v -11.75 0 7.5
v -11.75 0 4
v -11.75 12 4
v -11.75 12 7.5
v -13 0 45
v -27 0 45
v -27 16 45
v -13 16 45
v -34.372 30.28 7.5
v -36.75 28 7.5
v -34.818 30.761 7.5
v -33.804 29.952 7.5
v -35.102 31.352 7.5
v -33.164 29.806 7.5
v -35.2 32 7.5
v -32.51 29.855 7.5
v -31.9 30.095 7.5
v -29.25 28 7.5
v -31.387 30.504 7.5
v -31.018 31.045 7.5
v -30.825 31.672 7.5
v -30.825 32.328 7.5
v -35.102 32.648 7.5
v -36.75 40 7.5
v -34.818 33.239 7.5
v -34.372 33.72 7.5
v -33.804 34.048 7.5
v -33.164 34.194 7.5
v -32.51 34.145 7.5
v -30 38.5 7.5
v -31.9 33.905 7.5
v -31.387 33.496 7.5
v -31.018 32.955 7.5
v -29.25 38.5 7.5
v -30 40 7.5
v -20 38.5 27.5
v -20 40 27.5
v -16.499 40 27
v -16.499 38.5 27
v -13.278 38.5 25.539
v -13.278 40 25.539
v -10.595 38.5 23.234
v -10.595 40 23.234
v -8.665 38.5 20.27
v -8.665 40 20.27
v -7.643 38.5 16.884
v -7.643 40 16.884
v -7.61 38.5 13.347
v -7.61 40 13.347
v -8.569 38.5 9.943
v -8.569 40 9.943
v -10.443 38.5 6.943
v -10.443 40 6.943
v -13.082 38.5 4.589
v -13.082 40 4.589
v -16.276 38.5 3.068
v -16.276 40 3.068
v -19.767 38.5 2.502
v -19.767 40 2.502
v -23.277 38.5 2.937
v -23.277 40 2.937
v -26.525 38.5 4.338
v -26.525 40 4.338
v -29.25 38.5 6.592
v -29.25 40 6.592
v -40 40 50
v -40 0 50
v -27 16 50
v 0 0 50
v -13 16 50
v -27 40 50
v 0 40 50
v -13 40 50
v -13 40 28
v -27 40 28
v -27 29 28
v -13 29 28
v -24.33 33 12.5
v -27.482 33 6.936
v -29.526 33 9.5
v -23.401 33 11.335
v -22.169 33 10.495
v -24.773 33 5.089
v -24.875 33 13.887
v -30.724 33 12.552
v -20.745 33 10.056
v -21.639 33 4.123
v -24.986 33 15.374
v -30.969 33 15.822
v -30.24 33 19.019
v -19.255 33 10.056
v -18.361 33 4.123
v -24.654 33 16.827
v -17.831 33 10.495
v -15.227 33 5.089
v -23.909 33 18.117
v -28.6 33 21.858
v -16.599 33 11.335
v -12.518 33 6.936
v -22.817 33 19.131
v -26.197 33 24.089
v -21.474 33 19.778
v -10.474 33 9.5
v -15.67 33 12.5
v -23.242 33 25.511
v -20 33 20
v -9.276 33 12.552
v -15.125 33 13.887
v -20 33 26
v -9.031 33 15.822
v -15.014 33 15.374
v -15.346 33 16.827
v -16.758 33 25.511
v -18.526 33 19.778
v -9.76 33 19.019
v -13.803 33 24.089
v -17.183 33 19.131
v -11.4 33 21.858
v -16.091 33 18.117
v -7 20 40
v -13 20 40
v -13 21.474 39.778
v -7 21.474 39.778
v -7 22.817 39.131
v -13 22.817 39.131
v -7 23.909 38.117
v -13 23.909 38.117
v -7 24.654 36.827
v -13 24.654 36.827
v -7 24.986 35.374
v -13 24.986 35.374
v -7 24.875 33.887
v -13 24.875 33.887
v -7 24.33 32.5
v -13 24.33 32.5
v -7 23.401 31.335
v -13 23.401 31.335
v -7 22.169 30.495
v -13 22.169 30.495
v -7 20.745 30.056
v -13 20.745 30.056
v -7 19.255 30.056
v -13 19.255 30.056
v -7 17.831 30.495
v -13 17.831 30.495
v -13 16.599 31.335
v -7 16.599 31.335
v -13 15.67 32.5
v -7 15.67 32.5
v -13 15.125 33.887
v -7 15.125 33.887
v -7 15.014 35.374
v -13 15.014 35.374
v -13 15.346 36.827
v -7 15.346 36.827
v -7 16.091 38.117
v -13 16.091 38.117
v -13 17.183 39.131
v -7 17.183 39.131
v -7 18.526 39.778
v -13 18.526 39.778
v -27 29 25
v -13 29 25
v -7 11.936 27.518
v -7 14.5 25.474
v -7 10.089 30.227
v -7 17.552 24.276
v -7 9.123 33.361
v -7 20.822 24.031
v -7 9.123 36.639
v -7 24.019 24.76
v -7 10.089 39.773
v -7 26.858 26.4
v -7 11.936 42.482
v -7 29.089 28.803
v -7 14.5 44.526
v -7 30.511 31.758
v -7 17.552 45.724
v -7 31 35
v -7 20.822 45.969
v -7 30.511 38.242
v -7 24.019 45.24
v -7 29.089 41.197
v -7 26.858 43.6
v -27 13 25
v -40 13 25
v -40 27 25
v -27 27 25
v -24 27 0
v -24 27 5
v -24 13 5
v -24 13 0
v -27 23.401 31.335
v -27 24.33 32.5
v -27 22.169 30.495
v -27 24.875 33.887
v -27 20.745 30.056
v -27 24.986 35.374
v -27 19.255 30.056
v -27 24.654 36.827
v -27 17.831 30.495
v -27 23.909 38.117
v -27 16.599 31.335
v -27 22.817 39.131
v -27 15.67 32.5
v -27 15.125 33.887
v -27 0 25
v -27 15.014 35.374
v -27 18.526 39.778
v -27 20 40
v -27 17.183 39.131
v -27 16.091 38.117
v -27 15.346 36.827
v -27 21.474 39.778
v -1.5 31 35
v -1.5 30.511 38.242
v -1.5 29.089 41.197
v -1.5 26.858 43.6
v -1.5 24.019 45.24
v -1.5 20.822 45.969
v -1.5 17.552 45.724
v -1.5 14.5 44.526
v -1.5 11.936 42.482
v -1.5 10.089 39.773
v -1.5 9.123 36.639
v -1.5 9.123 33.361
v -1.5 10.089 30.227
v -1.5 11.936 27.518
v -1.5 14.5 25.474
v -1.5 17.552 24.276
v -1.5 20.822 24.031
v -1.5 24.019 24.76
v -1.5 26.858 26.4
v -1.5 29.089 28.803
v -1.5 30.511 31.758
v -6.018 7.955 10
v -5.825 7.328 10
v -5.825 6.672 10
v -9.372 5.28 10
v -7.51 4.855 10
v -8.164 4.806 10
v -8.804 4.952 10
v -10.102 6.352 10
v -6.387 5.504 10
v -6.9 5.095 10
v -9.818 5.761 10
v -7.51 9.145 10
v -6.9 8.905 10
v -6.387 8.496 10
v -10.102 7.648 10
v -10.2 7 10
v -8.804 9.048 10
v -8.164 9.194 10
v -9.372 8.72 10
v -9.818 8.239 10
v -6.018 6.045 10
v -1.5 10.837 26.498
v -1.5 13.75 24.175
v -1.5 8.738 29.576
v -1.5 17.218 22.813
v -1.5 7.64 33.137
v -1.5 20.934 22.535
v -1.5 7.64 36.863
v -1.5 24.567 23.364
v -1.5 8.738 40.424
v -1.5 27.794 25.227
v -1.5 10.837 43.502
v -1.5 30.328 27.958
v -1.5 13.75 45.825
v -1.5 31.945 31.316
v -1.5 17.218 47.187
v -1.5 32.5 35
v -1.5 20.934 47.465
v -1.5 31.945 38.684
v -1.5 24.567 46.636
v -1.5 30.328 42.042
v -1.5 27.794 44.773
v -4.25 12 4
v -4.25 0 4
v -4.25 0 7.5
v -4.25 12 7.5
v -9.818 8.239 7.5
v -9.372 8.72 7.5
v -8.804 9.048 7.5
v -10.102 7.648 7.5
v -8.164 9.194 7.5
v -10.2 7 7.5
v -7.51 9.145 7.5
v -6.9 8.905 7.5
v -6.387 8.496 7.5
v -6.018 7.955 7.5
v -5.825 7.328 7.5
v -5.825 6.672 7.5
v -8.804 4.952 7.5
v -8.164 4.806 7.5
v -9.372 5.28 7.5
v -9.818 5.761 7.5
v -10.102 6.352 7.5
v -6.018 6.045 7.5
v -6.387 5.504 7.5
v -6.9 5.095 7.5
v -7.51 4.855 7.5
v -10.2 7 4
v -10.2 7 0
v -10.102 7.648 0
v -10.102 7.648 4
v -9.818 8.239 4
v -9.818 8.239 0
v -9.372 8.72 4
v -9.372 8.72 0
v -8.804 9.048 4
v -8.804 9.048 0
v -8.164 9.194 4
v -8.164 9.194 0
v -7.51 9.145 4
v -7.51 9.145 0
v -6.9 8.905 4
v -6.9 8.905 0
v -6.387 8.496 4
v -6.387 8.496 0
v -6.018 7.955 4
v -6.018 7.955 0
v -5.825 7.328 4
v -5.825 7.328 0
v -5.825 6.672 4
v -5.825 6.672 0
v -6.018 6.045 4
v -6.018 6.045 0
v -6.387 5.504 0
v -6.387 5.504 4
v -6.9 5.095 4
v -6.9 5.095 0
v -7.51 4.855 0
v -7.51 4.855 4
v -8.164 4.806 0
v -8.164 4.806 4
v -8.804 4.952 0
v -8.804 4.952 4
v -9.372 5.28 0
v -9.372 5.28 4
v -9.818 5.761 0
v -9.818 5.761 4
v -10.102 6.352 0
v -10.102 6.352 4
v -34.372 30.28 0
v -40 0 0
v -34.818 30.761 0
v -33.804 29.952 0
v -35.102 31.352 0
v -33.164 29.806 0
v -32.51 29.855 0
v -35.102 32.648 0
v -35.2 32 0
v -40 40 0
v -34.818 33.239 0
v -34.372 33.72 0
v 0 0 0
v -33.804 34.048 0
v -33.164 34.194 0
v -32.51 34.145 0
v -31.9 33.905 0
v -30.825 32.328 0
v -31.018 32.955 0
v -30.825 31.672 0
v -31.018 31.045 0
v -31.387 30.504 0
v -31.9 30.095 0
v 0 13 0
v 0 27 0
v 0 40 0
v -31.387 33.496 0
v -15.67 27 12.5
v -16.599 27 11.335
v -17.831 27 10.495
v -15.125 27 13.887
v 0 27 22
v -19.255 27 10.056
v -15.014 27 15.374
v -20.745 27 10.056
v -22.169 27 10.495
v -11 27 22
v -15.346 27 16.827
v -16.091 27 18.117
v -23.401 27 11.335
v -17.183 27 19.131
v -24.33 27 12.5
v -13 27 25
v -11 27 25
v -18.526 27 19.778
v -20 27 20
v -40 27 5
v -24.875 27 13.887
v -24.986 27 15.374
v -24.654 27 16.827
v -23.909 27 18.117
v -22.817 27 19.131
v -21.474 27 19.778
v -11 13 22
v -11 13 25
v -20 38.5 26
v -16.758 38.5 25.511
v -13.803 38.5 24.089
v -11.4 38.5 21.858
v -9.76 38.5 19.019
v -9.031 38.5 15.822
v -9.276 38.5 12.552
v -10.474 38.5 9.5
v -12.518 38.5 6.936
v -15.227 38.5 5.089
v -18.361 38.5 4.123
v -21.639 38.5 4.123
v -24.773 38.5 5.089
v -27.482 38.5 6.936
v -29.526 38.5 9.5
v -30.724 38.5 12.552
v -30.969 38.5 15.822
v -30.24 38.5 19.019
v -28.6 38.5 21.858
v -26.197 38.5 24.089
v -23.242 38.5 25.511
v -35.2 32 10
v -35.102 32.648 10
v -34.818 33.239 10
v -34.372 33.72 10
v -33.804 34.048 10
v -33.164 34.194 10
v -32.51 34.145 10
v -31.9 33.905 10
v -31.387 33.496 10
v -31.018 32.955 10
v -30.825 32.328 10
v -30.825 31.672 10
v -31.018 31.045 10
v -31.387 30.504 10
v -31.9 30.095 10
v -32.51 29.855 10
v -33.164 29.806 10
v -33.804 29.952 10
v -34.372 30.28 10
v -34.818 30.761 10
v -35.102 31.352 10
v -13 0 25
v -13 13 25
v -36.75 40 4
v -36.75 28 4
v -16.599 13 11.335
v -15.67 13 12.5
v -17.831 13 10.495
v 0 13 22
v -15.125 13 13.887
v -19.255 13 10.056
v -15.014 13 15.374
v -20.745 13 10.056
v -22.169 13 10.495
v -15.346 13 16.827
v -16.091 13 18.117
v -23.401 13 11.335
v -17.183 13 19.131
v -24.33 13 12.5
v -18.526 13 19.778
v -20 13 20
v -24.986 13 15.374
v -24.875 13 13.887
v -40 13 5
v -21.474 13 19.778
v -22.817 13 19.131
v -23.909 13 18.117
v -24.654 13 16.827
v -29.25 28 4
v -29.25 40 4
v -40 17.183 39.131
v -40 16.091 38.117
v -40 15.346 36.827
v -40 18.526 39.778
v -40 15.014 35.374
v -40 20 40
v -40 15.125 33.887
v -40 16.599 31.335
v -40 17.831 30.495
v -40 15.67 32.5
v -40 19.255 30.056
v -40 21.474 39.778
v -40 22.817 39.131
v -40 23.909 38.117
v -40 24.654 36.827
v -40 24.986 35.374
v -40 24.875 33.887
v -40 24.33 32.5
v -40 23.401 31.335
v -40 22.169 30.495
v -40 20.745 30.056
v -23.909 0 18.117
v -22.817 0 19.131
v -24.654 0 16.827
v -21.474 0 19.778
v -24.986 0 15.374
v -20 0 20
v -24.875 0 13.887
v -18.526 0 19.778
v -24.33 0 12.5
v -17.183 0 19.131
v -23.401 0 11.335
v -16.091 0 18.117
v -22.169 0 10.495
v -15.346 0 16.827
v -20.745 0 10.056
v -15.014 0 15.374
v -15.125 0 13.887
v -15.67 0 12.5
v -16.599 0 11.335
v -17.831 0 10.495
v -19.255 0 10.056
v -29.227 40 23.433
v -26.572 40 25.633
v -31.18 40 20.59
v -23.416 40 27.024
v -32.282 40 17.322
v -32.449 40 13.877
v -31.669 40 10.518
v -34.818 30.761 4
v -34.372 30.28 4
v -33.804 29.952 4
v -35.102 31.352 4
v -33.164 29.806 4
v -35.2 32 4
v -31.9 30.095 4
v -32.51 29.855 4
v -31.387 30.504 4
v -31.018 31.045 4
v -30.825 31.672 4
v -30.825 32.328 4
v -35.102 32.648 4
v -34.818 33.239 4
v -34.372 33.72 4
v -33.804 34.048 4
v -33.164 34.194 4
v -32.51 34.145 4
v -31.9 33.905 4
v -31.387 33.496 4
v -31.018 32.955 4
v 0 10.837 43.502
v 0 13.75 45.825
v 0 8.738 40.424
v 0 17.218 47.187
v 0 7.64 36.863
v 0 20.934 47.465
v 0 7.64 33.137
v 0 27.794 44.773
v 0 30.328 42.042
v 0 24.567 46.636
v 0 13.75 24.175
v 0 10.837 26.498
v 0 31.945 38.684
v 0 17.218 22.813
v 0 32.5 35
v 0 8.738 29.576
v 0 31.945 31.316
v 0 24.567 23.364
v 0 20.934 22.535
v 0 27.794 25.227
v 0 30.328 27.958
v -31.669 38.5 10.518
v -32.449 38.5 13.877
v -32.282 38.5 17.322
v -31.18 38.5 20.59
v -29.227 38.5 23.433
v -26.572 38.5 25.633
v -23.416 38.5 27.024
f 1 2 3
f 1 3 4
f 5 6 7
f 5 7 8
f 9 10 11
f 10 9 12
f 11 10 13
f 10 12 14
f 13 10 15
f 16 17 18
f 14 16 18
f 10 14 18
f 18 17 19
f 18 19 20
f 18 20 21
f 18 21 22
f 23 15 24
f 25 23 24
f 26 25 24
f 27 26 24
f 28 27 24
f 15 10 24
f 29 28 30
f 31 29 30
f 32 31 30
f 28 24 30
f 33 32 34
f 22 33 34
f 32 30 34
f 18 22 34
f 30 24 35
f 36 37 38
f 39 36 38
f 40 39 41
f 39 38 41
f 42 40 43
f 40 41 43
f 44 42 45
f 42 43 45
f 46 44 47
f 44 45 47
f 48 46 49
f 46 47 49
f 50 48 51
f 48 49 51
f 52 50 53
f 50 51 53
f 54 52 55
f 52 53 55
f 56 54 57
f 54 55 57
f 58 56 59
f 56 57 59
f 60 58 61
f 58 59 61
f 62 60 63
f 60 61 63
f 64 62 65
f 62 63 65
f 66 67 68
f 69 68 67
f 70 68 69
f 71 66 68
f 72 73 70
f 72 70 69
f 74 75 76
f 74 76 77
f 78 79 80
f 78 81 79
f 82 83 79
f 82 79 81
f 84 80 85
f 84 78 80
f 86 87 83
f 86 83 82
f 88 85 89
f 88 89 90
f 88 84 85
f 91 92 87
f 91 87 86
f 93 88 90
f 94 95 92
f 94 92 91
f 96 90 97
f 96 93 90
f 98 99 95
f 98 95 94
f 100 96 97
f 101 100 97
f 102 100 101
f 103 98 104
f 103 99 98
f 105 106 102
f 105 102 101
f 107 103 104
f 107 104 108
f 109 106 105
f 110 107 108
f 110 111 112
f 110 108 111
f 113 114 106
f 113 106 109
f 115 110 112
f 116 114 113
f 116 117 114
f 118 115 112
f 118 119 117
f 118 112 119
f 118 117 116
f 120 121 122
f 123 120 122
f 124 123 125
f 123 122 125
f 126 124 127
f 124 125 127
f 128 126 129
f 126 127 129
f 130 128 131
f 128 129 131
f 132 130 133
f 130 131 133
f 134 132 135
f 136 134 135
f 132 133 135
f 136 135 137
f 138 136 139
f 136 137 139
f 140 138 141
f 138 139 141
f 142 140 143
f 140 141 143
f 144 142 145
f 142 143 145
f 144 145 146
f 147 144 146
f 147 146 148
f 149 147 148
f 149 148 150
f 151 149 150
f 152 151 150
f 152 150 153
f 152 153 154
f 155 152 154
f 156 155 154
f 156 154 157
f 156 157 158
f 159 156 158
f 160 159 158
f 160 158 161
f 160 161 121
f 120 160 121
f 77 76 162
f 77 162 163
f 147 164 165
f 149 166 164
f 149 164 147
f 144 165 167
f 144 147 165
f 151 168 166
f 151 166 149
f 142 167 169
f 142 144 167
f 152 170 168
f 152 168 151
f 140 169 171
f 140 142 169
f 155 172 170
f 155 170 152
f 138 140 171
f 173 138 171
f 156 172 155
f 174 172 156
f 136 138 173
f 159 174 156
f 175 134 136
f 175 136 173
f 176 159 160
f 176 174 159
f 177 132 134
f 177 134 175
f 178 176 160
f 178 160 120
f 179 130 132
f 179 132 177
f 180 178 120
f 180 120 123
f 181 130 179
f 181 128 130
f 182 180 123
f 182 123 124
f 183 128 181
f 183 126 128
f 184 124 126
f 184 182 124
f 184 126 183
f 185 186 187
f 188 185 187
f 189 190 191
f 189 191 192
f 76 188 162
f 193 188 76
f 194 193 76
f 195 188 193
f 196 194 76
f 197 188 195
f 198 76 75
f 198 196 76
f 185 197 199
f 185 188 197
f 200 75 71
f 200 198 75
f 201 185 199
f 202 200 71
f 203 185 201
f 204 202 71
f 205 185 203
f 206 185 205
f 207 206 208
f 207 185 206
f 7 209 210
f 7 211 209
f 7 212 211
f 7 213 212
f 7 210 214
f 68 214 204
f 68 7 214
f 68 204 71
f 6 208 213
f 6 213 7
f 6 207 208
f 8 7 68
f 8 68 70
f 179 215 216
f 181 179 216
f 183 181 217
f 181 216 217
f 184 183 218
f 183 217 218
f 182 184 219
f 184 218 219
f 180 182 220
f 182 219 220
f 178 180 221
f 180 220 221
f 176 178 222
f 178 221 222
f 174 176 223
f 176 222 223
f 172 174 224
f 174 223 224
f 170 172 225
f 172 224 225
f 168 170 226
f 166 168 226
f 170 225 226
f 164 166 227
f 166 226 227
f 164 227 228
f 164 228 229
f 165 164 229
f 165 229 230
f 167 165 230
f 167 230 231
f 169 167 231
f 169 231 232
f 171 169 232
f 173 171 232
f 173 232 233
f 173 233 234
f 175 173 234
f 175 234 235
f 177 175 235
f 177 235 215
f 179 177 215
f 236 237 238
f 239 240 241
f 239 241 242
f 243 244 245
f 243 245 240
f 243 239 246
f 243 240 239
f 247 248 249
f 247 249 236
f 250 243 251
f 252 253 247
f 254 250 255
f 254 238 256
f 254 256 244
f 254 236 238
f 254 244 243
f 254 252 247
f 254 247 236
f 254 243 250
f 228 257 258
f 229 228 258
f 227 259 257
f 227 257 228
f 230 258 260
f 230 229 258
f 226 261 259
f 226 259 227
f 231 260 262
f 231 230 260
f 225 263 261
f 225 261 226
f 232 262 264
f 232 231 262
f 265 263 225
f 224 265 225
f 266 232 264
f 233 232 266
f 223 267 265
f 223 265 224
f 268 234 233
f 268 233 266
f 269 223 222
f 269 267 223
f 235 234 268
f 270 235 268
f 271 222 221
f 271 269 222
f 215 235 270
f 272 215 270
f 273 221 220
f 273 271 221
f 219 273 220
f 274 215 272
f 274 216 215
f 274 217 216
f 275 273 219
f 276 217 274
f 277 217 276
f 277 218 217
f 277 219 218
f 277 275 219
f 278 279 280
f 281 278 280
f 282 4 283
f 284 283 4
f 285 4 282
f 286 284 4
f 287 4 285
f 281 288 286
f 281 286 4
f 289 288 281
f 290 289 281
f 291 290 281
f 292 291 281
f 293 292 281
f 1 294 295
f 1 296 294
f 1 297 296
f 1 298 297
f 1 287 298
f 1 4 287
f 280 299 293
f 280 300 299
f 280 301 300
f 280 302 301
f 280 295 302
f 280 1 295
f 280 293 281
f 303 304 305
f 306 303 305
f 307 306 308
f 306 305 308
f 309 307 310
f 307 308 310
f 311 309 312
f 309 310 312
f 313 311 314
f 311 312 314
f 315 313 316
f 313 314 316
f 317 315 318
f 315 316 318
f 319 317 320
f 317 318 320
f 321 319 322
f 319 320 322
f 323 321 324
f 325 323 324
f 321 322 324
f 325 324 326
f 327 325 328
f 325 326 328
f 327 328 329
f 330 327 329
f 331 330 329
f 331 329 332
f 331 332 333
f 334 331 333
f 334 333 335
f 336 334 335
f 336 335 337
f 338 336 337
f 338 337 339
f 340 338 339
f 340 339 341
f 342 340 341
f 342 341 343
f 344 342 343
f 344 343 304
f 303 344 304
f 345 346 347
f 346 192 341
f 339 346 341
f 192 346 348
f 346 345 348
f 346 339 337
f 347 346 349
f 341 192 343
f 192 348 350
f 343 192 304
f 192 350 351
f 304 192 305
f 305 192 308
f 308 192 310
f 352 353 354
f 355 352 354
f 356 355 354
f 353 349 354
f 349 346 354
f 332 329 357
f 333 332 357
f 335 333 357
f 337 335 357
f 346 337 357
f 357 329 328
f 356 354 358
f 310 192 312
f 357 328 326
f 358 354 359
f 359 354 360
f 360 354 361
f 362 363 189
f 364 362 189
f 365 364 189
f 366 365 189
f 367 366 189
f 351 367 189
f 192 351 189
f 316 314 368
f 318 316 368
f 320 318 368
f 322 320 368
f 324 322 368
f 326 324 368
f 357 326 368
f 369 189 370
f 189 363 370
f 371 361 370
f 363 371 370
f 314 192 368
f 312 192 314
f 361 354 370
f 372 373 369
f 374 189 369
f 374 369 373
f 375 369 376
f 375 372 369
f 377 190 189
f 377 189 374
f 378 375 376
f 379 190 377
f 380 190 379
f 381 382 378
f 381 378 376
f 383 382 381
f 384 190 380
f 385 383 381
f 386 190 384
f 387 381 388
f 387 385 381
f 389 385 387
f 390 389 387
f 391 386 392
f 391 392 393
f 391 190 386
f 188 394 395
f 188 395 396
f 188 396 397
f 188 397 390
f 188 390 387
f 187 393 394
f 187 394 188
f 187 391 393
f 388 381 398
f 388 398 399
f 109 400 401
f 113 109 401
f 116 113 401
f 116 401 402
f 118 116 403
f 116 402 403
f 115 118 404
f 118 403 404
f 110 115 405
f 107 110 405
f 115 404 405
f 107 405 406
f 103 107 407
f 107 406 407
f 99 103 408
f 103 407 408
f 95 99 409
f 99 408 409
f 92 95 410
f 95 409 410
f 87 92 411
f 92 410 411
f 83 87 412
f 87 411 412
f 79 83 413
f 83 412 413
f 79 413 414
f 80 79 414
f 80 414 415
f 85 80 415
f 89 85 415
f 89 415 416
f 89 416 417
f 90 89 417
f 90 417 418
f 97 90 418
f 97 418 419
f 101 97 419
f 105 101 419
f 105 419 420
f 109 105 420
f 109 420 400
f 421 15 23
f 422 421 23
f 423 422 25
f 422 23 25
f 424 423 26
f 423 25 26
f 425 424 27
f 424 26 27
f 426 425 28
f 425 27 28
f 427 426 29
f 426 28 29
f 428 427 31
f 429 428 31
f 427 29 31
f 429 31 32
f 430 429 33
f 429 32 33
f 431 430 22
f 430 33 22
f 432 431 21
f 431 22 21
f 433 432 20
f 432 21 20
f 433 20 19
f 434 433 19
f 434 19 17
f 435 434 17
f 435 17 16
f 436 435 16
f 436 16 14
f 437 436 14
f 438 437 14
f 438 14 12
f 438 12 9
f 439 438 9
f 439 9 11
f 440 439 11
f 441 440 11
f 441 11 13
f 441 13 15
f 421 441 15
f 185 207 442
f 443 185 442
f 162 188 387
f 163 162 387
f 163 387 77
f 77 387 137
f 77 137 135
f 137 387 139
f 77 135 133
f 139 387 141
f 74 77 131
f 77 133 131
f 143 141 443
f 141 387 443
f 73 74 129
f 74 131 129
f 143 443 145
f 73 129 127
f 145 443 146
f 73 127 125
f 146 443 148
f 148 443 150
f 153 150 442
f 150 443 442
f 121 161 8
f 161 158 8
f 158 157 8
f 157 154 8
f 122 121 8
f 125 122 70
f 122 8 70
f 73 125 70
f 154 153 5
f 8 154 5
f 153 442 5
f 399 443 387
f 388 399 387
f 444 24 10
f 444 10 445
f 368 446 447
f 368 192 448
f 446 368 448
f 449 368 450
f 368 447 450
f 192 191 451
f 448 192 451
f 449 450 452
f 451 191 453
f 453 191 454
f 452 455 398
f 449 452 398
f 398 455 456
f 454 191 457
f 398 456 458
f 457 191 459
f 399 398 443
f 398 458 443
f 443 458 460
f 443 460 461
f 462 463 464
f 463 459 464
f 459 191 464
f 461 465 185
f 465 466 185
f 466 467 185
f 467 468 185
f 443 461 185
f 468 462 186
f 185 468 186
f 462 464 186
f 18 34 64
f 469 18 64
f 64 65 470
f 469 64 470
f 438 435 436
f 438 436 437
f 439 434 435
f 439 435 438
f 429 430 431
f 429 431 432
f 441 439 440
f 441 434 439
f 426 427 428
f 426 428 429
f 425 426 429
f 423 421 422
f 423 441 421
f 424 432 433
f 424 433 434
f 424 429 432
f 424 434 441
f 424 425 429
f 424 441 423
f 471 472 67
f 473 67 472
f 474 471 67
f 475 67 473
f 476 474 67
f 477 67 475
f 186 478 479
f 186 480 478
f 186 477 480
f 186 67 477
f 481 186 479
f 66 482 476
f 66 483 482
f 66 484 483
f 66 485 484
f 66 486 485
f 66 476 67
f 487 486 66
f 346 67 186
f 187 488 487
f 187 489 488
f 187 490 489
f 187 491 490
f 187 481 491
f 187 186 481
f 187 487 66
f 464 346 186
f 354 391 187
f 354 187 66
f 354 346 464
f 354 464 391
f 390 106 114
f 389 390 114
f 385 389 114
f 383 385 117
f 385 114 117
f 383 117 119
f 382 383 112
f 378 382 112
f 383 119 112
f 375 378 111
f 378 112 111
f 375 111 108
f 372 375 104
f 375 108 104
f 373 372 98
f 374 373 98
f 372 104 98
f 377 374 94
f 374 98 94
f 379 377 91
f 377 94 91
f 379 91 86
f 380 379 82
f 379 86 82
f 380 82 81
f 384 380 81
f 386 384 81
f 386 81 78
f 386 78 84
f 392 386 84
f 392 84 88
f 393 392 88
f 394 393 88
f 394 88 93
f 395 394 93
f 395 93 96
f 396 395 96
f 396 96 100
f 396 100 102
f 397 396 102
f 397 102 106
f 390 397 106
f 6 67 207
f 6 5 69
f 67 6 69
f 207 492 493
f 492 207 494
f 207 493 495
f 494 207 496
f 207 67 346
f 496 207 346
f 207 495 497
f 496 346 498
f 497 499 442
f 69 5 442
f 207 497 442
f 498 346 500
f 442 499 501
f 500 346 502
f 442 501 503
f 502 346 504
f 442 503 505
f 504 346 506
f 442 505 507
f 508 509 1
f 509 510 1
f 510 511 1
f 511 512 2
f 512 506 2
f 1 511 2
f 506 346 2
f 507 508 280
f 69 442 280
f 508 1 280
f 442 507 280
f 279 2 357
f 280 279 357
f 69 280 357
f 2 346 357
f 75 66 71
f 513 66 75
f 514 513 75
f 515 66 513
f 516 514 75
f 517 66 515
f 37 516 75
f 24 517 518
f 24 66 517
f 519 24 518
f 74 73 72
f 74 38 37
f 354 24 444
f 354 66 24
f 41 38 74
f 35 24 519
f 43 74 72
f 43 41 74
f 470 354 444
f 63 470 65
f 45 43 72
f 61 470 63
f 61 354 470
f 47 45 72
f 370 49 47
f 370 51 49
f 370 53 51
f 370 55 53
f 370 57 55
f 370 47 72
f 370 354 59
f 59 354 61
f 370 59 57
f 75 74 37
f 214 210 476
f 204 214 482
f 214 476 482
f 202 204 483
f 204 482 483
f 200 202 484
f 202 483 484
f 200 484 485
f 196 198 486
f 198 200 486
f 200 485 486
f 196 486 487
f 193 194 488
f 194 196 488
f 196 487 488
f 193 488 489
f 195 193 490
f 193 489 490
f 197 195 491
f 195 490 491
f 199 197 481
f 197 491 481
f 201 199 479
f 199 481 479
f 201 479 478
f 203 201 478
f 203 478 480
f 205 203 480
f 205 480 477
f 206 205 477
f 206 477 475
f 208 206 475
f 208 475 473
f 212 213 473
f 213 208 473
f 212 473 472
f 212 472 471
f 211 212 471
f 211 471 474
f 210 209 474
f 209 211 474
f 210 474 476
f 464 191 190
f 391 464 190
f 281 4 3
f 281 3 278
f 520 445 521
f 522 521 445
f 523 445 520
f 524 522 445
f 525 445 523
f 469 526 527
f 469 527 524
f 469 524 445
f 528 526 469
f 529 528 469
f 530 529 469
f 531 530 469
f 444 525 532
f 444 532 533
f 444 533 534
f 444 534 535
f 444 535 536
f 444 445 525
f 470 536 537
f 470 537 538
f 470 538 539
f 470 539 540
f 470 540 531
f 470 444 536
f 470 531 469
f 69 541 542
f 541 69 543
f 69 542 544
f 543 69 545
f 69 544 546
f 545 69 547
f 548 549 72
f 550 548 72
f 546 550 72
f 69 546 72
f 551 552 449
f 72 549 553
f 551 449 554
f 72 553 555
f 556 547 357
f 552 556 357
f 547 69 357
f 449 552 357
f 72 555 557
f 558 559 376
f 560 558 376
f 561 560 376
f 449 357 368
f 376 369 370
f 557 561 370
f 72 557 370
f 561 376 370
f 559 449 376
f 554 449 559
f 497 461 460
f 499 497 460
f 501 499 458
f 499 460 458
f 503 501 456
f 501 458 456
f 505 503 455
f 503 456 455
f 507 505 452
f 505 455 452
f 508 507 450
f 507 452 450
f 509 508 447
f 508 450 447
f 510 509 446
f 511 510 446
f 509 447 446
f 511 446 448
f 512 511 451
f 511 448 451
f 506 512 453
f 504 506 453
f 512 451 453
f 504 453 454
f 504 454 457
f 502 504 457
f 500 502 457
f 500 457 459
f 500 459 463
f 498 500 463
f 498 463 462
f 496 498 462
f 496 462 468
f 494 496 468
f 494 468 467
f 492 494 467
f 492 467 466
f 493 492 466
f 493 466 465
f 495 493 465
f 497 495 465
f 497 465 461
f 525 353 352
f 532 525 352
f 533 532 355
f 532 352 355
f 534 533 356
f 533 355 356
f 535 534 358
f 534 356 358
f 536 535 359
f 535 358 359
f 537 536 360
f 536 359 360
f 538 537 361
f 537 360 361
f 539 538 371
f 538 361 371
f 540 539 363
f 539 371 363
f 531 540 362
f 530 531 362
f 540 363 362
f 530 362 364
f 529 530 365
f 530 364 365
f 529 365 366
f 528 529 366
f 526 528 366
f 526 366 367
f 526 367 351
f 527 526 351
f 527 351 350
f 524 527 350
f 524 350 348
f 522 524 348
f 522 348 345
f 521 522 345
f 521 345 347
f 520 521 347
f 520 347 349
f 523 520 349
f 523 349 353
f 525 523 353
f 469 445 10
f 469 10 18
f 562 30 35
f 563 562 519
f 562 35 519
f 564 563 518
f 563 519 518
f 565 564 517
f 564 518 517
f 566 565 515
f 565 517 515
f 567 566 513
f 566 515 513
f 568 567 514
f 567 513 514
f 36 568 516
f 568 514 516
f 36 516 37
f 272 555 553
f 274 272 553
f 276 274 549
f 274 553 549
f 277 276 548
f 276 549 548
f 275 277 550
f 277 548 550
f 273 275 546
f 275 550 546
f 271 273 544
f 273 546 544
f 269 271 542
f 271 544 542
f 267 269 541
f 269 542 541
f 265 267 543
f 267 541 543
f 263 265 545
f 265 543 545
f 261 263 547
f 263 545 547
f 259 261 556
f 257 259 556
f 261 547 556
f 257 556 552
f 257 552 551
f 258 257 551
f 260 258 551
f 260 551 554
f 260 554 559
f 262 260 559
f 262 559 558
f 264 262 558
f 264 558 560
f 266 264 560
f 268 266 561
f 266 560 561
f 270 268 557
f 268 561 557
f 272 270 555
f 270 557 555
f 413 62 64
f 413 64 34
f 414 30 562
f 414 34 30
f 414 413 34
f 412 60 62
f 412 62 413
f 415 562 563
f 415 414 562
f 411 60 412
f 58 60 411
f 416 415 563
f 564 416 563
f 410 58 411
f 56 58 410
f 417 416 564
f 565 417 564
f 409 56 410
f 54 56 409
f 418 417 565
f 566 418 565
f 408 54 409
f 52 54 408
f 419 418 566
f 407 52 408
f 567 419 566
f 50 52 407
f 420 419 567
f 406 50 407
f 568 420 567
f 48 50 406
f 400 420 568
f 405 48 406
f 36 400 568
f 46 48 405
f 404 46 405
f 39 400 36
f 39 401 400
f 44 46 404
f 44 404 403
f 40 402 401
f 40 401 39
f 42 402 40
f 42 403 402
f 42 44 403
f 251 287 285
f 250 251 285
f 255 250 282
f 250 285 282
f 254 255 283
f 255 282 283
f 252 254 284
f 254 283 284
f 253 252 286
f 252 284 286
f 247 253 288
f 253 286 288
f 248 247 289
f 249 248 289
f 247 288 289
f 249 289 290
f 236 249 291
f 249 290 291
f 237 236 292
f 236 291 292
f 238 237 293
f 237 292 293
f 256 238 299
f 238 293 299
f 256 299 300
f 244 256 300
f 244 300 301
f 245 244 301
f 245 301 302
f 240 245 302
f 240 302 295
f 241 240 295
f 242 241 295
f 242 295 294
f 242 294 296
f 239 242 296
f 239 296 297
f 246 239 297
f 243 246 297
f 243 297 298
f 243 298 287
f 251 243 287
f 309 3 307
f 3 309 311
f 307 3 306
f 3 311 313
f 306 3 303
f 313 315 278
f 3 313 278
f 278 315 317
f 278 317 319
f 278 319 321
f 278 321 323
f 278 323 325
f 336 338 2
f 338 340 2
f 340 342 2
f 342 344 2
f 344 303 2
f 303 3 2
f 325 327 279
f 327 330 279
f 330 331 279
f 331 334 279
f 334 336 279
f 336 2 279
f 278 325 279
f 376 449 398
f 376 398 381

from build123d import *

# Parameters (mm, degrees)
ESQUISSE1_W              = 40
ESQUISSE1_H              = 40
BOSS_EXTRU_1_DEPTH       = 50
ESQUISSE2_R              = 5
ENL_V_MAT_EXTRU_1_DEPTH  = 41
ESQUISSE3_R              = 5
ENL_V_MAT_EXTRU_2_DEPTH  = 41
ESQUISSE4_W              = 20
ESQUISSE4_H              = 14
ENL_V_MAT_EXTRU_3_DEPTH  = 29
ESQUISSE5_W              = 14
ESQUISSE5_H              = 20
ENL_V_MAT_EXTRU_4_DEPTH  = 29
ESQUISSE6_W              = 22
ESQUISSE6_H              = 14
ENL_V_MAT_EXTRU_5_DEPTH  = 24
ESQUISSE7_W              = 14
ESQUISSE7_H              = 22
ENL_V_MAT_EXTRU_6_DEPTH  = 24
ESQUISSE8_R              = 11
ENL_V_MAT_EXTRU_7_DEPTH  = 7
ESQUISSE9_R              = 12.5
ENL_V_MAT_EXTRU_8_DEPTH  = 1.5
ESQUISSE10_R             = 11
ENL_V_MAT_EXTRU_9_DEPTH  = 7
ESQUISSE11_R             = 12.5
ENL_V_MAT_EXTRU_10_DEPTH = 1.5
ESQUISSE13_R             = 2.2
ENL_V_MAT_EXTRU_11_DEPTH = 10
ESQUISSE15_W             = 7.5
ESQUISSE15_H             = 3.5
ENL_V_MAT_EXTRU_13_DEPTH = 12
ESQUISSE16_W             = 7.5
ESQUISSE16_H             = 3.5
ENL_V_MAT_EXTRU_14_DEPTH = 12


with BuildPart() as part:
    # Esquisse1 → Boss.-Extru.1 (new body)
    with BuildSketch(Plane.XY):
        with Locations((-20, 20)):
            Rectangle(ESQUISSE1_W, ESQUISSE1_H)
    extrude(amount=BOSS_EXTRU_1_DEPTH)

    # Esquisse2 → Enlèv. mat.-Extru.1 (cut, through all)
    with BuildSketch(Plane(origin=(0, 40, 0), x_dir=(1, 0, 0), z_dir=(0, 1, 0))):
        with Locations(Location((-20, -15, 0), (0, 0, 270))):  # turned: the seam where the file's is
            Circle(ESQUISSE2_R)
    extrude(amount=-ENL_V_MAT_EXTRU_1_DEPTH, mode=Mode.SUBTRACT)

    # Esquisse3 → Enlèv. mat.-Extru.2 (cut, through all)
    with BuildSketch(Plane.ZY.offset(40)):
        with Locations((35, 20)):
            Circle(ESQUISSE3_R)
    extrude(amount=-ENL_V_MAT_EXTRU_2_DEPTH, mode=Mode.SUBTRACT)

    # Esquisse4 → Enlèv. mat.-Extru.3 (cut)
    with BuildSketch(Plane.ZY.offset(40)):
        with Locations((15, 20)):
            Rectangle(ESQUISSE4_W, ESQUISSE4_H)
    extrude(amount=-ENL_V_MAT_EXTRU_3_DEPTH, mode=Mode.SUBTRACT)

    # Esquisse5 → Enlèv. mat.-Extru.4 (cut)
    with BuildSketch(Plane.XZ):
        with Locations((-20, 35)):
            Rectangle(ESQUISSE5_W, ESQUISSE5_H)
    extrude(amount=-ENL_V_MAT_EXTRU_4_DEPTH, mode=Mode.SUBTRACT)

    # Esquisse6 → Enlèv. mat.-Extru.5 (cut)
    with BuildSketch(Plane(origin=(0, 0, 0), x_dir=(0, 0, -1), z_dir=(1, 0, 0))):
        with Locations((-11, 20)):
            Rectangle(ESQUISSE6_W, ESQUISSE6_H)
    extrude(amount=-ENL_V_MAT_EXTRU_5_DEPTH, mode=Mode.SUBTRACT)

    # Esquisse7 → Enlèv. mat.-Extru.6 (cut)
    with BuildSketch(Plane(origin=(0, 40, 0), x_dir=(1, 0, 0), z_dir=(0, 1, 0))):
        with Locations((-20, -39)):
            Rectangle(ESQUISSE7_W, ESQUISSE7_H)
    extrude(amount=-ENL_V_MAT_EXTRU_6_DEPTH, mode=Mode.SUBTRACT)

    # Esquisse8 → Enlèv. mat.-Extru.7 (cut)
    with BuildSketch(Plane(origin=(0, 0, 0), x_dir=(0, 0, -1), z_dir=(1, 0, 0))):
        with Locations(Location((-35, 20, 0), (0, 0, 90))):  # turned: the seam where the file's is
            Circle(ESQUISSE8_R)
    extrude(amount=-ENL_V_MAT_EXTRU_7_DEPTH, mode=Mode.SUBTRACT)

    # Esquisse9 → Enlèv. mat.-Extru.8 (cut)
    with BuildSketch(Plane(origin=(0, 0, 0), x_dir=(0, 0, -1), z_dir=(1, 0, 0))):
        with Locations(Location((-35, 20, 0), (0, 0, 90))):  # turned: the seam where the file's is
            Circle(ESQUISSE9_R)
    extrude(amount=-ENL_V_MAT_EXTRU_8_DEPTH, mode=Mode.SUBTRACT)

    # Esquisse10 → Enlèv. mat.-Extru.9 (cut)
    with BuildSketch(Plane(origin=(0, 40, 0), x_dir=(1, 0, 0), z_dir=(0, 1, 0))):
        with Locations(Location((-20, -15, 0), (0, 0, 270))):  # turned: the seam where the file's is
            Circle(ESQUISSE10_R)
    extrude(amount=-ENL_V_MAT_EXTRU_9_DEPTH, mode=Mode.SUBTRACT)

    # Esquisse11 → Enlèv. mat.-Extru.10 (cut)
    with BuildSketch(Plane(origin=(0, 40, 0), x_dir=(1, 0, 0), z_dir=(0, 1, 0))):
        with Locations(Location((-20, -15, 0), (0, 0, 270))):  # turned: the seam where the file's is
            Circle(ESQUISSE11_R)
    extrude(amount=-ENL_V_MAT_EXTRU_10_DEPTH, mode=Mode.SUBTRACT)

    # Esquisse13 → Enlèv. mat.-Extru.11 (cut)
    with BuildSketch(Plane(origin=(0, 0, 0), x_dir=(-1, 0, 0), z_dir=(0, 0, -1))):
        with Locations((33, 32)):
            Circle(ESQUISSE13_R)
        with Locations((8, 7)):
            Circle(ESQUISSE13_R)
    extrude(amount=-ENL_V_MAT_EXTRU_11_DEPTH, mode=Mode.SUBTRACT)

    # Esquisse15 → Enlèv. mat.-Extru.13 (cut)
    with BuildSketch(Plane(origin=(0, 40, 0), x_dir=(1, 0, 0), z_dir=(0, 1, 0))):
        with Locations((-33, -5.75)):
            Rectangle(ESQUISSE15_W, ESQUISSE15_H)
    extrude(amount=-ENL_V_MAT_EXTRU_13_DEPTH, mode=Mode.SUBTRACT)

    # Esquisse16 → Enlèv. mat.-Extru.14 (cut)
    with BuildSketch(Plane.XZ):
        with Locations((-8, 5.75)):
            Rectangle(ESQUISSE16_W, ESQUISSE16_H)
    extrude(amount=-ENL_V_MAT_EXTRU_14_DEPTH, mode=Mode.SUBTRACT)


solid = part.part
